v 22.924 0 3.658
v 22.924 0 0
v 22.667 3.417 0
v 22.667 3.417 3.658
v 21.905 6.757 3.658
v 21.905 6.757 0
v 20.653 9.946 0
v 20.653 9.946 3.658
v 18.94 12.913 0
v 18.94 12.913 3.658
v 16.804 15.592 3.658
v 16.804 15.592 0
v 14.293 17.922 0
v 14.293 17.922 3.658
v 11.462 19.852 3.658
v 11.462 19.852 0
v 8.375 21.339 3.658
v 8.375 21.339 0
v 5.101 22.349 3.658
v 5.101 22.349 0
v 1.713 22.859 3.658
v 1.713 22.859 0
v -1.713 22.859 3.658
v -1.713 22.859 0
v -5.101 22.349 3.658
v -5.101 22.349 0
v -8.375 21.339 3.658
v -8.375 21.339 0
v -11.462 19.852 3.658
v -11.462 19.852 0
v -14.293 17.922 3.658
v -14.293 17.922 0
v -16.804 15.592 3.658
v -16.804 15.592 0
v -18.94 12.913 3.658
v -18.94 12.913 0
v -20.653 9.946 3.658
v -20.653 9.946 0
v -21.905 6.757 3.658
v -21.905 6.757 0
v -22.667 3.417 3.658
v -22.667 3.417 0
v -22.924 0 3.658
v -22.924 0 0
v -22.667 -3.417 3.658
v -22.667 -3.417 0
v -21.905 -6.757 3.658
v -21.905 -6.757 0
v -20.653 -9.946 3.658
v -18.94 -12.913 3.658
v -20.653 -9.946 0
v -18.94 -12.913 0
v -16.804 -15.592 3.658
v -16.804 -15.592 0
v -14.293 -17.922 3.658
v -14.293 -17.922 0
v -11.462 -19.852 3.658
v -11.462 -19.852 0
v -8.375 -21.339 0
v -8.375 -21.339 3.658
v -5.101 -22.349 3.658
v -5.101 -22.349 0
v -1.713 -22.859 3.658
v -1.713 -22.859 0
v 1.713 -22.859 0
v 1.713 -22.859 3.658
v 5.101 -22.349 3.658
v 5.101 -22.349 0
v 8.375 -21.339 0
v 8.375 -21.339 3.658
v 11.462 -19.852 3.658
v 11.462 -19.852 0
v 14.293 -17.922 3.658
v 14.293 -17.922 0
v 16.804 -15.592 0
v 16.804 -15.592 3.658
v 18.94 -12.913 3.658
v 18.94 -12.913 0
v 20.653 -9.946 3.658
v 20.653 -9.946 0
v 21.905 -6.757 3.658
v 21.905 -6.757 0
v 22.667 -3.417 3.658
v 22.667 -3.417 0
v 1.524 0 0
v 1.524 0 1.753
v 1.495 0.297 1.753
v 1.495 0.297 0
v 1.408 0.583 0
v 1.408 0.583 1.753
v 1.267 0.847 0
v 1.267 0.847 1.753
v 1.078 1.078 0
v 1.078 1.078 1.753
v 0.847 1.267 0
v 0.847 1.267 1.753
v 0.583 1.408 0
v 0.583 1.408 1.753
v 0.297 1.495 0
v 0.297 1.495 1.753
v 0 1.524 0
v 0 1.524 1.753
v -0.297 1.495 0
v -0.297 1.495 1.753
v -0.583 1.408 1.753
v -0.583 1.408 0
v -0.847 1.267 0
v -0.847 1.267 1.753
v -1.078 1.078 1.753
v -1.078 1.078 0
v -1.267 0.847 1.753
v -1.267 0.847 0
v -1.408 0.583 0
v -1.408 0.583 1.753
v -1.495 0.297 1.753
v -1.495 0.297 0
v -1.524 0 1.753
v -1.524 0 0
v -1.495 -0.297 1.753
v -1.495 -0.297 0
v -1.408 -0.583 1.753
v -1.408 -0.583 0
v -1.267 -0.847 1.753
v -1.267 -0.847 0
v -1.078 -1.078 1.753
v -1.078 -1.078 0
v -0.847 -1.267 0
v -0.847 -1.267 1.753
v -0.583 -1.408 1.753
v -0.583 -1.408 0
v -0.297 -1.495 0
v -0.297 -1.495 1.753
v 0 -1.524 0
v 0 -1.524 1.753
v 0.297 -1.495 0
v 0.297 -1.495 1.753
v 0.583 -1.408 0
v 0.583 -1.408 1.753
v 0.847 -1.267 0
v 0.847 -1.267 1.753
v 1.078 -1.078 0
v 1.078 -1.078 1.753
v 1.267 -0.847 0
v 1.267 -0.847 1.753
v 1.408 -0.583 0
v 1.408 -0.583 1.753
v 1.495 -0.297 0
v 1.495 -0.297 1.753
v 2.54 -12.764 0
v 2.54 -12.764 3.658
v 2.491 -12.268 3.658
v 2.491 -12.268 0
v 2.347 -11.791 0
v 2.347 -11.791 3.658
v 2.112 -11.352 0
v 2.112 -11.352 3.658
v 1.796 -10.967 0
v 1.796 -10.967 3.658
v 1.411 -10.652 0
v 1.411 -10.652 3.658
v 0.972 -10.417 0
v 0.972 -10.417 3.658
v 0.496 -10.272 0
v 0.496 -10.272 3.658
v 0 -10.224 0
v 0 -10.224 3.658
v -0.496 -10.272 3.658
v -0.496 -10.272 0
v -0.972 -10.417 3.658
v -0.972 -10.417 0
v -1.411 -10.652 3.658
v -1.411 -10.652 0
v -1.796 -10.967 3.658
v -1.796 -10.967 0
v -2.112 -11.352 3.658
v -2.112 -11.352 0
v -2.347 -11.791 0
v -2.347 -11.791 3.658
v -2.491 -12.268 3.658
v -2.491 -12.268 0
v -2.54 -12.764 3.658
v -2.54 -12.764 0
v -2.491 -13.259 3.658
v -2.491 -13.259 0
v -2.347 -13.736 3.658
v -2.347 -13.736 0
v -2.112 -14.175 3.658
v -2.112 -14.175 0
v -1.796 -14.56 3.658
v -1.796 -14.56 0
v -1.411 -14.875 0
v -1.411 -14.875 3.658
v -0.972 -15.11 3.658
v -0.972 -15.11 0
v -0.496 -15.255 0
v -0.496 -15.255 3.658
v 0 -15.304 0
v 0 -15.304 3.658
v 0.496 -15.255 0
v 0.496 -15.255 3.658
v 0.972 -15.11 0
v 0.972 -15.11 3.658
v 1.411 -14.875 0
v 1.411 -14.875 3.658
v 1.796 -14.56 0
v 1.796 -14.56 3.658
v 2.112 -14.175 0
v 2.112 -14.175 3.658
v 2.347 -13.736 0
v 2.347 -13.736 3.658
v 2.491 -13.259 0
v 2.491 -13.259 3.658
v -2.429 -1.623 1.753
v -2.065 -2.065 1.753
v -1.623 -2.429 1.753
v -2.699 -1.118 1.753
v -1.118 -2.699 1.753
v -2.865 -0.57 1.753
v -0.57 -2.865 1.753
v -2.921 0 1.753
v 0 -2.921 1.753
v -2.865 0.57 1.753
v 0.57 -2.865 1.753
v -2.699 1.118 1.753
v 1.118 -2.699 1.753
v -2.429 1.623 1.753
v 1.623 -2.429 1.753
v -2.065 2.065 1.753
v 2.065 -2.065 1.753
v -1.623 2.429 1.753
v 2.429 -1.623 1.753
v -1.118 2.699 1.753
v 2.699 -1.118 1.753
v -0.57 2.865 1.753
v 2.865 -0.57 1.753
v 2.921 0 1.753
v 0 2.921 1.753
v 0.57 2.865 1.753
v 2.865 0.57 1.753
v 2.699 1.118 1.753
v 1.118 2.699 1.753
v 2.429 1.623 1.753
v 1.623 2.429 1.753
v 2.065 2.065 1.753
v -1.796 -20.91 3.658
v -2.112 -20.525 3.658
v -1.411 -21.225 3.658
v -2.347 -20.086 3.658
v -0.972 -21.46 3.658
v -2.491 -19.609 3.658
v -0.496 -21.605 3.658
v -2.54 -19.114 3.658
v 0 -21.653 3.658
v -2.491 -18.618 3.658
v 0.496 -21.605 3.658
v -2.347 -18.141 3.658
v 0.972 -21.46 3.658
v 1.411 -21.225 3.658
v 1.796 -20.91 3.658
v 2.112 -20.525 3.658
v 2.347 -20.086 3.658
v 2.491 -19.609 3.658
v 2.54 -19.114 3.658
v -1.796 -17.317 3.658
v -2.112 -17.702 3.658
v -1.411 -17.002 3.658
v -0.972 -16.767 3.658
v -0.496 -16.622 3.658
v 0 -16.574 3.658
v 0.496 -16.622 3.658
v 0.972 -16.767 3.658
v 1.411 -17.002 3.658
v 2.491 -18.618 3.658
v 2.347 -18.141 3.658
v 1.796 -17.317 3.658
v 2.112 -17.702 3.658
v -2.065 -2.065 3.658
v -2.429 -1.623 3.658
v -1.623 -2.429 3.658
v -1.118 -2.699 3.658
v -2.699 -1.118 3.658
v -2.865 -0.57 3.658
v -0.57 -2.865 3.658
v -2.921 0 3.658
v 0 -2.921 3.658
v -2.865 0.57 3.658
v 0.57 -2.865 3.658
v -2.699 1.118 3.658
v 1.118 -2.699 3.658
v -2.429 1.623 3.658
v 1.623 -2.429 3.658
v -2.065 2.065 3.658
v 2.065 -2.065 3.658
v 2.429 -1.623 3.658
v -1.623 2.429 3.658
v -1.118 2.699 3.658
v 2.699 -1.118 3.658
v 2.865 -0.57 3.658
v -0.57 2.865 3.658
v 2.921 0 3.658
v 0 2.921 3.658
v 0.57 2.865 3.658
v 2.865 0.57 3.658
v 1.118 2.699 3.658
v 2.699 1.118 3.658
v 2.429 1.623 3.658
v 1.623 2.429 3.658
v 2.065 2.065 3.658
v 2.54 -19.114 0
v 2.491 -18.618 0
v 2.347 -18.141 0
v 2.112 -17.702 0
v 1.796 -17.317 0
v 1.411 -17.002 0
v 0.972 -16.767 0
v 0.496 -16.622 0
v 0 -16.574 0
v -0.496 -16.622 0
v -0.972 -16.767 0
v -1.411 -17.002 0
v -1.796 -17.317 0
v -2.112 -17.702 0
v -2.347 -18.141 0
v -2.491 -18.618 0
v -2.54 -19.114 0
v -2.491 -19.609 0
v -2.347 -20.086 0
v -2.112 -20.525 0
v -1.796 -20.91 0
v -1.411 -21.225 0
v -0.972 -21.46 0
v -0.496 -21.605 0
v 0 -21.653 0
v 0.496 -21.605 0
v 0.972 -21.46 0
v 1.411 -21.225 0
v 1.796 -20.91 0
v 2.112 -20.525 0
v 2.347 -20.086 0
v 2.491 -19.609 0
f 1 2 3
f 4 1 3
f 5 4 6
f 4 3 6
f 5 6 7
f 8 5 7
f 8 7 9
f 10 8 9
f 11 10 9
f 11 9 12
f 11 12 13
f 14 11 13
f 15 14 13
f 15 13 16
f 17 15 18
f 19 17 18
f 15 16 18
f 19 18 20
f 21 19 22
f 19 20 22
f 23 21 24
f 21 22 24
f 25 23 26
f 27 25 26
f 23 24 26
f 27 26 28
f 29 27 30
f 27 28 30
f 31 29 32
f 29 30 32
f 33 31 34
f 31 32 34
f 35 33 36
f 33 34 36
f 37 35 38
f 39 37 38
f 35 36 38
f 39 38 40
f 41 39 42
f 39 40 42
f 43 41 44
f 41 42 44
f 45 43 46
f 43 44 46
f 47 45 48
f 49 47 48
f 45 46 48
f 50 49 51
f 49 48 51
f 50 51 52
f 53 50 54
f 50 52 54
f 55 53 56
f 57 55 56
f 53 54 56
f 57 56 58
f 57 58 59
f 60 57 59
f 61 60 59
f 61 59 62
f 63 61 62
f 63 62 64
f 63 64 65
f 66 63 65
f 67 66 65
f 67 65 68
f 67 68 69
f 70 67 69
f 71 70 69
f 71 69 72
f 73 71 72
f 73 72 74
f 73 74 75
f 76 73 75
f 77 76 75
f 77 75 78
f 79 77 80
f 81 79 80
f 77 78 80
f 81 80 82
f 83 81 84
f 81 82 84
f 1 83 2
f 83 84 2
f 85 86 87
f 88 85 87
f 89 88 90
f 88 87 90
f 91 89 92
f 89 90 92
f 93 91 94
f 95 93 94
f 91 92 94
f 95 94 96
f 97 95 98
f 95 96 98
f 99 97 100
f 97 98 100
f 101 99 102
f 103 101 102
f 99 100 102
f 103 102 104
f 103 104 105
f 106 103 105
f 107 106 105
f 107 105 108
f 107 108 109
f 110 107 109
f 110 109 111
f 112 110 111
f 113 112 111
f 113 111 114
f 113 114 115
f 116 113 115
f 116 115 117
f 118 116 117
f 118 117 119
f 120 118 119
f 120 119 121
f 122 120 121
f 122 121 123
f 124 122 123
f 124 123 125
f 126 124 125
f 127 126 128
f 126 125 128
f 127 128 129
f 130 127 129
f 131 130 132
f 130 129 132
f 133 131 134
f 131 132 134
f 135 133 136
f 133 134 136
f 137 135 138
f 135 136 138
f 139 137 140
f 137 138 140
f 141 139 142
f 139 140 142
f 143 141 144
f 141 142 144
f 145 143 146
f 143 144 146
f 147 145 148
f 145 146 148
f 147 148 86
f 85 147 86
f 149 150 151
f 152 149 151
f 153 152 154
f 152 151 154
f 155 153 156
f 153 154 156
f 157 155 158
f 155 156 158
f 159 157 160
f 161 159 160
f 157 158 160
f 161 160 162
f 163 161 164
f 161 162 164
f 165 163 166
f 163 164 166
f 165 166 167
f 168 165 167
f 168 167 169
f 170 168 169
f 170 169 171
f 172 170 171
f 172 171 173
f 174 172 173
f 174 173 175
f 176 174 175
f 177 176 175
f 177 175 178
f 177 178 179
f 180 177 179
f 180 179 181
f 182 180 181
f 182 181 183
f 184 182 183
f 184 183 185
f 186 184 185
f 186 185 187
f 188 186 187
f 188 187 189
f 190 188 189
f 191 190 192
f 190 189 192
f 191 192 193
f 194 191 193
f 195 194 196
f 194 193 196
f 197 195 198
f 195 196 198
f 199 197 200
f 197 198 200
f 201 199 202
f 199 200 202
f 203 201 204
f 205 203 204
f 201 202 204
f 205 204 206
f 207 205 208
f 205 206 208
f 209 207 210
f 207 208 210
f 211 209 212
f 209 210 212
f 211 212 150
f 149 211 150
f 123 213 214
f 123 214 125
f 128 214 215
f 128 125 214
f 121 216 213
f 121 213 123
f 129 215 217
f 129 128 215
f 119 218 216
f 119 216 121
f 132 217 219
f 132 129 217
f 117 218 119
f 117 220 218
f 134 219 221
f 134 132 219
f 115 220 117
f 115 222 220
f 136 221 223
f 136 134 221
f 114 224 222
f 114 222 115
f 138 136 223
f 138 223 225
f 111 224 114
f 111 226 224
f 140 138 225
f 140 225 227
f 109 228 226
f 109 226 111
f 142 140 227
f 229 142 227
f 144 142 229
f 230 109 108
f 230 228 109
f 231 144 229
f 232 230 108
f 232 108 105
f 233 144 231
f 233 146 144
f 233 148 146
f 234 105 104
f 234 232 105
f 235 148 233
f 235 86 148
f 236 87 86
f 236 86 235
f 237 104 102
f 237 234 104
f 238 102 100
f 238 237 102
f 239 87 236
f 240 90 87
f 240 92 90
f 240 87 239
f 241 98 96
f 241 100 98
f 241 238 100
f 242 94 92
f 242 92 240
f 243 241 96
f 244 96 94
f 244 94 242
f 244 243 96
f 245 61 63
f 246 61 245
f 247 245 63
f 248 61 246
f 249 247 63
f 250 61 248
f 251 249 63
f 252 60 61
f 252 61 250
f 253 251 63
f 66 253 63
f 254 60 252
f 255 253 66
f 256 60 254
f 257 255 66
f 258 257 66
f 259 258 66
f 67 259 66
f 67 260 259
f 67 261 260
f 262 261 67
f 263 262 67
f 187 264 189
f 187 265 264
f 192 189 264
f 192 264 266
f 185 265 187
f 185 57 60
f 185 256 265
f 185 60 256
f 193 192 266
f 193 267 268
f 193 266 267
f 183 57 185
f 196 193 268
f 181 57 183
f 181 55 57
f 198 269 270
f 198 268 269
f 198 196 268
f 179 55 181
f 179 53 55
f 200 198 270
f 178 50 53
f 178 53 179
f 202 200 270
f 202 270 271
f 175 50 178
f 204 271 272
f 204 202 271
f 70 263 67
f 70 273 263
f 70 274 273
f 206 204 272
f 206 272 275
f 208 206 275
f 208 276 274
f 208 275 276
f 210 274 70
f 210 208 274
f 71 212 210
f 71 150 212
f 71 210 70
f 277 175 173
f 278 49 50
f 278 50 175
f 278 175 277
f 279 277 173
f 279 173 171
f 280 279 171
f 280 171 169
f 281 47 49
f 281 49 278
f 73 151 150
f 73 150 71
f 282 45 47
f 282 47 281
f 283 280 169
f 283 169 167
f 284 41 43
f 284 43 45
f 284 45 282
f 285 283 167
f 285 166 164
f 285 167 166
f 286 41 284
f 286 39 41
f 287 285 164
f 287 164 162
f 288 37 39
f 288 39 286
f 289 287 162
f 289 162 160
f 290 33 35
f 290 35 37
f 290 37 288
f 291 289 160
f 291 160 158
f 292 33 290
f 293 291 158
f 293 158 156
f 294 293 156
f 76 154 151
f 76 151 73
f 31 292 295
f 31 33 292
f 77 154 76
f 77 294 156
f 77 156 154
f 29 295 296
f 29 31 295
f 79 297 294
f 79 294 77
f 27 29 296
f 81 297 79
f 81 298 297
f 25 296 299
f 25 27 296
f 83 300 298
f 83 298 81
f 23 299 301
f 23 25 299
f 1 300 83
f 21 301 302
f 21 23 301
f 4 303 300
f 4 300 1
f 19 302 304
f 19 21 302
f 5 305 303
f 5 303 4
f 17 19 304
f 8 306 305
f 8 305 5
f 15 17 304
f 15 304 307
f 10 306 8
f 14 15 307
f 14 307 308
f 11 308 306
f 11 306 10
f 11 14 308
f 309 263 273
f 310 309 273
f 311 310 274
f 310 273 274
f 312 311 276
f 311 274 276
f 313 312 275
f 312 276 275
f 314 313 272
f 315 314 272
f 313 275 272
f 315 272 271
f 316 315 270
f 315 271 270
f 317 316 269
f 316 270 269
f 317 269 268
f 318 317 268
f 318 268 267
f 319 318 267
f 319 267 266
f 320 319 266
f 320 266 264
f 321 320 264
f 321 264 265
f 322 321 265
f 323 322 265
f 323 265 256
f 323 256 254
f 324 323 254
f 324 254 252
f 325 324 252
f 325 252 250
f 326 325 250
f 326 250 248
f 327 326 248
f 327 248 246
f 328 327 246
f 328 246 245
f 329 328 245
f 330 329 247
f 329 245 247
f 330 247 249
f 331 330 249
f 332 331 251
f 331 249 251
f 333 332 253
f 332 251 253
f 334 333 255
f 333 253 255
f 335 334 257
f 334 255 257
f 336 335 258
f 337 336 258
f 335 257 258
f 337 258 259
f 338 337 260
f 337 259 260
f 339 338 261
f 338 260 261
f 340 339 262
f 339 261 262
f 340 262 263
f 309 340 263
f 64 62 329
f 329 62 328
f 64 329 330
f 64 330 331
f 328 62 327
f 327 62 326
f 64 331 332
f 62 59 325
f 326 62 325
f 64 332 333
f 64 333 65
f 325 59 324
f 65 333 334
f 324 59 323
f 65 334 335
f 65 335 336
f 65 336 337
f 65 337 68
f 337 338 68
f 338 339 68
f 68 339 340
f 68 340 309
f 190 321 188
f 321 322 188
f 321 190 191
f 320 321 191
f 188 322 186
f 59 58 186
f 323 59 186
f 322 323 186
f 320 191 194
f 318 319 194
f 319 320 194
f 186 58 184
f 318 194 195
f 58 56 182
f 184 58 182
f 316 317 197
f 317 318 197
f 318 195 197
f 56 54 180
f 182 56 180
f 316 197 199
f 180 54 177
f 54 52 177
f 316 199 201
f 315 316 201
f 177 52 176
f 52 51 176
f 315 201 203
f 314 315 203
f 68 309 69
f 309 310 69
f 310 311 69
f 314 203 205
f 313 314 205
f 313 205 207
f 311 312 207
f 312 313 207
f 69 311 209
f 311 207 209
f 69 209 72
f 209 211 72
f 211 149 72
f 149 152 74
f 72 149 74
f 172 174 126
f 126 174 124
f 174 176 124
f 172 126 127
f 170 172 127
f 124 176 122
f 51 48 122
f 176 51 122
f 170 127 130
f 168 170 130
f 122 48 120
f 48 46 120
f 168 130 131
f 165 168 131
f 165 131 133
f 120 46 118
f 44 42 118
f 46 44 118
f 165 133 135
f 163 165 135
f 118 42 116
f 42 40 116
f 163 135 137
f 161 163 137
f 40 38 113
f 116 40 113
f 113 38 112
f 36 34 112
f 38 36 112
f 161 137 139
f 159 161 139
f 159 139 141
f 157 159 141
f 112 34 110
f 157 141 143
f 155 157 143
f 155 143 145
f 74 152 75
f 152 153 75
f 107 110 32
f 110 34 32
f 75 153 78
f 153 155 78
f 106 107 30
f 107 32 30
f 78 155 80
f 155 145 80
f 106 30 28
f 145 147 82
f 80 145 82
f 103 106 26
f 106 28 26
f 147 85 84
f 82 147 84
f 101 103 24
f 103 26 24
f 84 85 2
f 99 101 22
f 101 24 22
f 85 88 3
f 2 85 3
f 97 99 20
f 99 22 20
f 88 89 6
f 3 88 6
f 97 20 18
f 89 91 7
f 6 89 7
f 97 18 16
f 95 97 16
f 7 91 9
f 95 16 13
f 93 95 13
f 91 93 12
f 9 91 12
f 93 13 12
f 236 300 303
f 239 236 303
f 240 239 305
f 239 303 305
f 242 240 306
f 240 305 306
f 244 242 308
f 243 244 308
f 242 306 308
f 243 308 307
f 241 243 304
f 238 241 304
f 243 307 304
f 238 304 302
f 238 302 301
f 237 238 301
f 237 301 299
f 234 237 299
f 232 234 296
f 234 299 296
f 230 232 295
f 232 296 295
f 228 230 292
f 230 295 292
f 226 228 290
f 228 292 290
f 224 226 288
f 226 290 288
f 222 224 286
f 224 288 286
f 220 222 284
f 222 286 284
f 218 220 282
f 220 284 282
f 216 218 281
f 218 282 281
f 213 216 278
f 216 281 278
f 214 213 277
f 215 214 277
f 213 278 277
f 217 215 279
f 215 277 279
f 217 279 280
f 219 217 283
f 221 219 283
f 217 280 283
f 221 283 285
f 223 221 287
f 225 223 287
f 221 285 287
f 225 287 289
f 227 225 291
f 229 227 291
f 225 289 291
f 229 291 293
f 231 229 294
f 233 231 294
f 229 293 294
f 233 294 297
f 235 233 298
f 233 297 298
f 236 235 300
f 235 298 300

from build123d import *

# Parameters (mm, degrees)
F0_R     = 22.9235
F1_DEPTH = 3.6576
F2_R     = 2.54
F3_DEPTH = 3.6586
F2_R_2   = 1.524
F4_DEPTH = 25.4
F5_R     = 2.921
F5_R_2   = 1.524
F6_DEPTH = 1.905


# Not quite as in the source:
# - a feature names something its author has since deleted; it is built from what else it names


with BuildPart() as f1:
    # F0 (on Top) → F1 (new body)
    with BuildSketch(Plane.XY):
        Circle(F0_R)
    extrude(amount=F1_DEPTH)

    # F2 (on face) → F3 (cut, through all)
    with BuildSketch(Plane.XY.offset(3.6576)):
        with Locations((0, -19.1135)):
            Circle(F2_R)
        with Locations((0, -12.7635)):
            Circle(F2_R)
    extrude(amount=-F3_DEPTH, mode=Mode.SUBTRACT)

    # F2 (on face) → F4 (cut)
    with BuildSketch(Plane.XY.offset(3.6576)):
        Circle(F2_R_2)
    extrude(amount=-F4_DEPTH, mode=Mode.SUBTRACT)

    # F5 (on face) → F6 (cut)
    with BuildSketch(Plane.XY.offset(3.6576)):
        Circle(F5_R)
        Circle(F5_R_2, mode=Mode.SUBTRACT)
    extrude(amount=-F6_DEPTH, mode=Mode.SUBTRACT)


solid = f1.part
